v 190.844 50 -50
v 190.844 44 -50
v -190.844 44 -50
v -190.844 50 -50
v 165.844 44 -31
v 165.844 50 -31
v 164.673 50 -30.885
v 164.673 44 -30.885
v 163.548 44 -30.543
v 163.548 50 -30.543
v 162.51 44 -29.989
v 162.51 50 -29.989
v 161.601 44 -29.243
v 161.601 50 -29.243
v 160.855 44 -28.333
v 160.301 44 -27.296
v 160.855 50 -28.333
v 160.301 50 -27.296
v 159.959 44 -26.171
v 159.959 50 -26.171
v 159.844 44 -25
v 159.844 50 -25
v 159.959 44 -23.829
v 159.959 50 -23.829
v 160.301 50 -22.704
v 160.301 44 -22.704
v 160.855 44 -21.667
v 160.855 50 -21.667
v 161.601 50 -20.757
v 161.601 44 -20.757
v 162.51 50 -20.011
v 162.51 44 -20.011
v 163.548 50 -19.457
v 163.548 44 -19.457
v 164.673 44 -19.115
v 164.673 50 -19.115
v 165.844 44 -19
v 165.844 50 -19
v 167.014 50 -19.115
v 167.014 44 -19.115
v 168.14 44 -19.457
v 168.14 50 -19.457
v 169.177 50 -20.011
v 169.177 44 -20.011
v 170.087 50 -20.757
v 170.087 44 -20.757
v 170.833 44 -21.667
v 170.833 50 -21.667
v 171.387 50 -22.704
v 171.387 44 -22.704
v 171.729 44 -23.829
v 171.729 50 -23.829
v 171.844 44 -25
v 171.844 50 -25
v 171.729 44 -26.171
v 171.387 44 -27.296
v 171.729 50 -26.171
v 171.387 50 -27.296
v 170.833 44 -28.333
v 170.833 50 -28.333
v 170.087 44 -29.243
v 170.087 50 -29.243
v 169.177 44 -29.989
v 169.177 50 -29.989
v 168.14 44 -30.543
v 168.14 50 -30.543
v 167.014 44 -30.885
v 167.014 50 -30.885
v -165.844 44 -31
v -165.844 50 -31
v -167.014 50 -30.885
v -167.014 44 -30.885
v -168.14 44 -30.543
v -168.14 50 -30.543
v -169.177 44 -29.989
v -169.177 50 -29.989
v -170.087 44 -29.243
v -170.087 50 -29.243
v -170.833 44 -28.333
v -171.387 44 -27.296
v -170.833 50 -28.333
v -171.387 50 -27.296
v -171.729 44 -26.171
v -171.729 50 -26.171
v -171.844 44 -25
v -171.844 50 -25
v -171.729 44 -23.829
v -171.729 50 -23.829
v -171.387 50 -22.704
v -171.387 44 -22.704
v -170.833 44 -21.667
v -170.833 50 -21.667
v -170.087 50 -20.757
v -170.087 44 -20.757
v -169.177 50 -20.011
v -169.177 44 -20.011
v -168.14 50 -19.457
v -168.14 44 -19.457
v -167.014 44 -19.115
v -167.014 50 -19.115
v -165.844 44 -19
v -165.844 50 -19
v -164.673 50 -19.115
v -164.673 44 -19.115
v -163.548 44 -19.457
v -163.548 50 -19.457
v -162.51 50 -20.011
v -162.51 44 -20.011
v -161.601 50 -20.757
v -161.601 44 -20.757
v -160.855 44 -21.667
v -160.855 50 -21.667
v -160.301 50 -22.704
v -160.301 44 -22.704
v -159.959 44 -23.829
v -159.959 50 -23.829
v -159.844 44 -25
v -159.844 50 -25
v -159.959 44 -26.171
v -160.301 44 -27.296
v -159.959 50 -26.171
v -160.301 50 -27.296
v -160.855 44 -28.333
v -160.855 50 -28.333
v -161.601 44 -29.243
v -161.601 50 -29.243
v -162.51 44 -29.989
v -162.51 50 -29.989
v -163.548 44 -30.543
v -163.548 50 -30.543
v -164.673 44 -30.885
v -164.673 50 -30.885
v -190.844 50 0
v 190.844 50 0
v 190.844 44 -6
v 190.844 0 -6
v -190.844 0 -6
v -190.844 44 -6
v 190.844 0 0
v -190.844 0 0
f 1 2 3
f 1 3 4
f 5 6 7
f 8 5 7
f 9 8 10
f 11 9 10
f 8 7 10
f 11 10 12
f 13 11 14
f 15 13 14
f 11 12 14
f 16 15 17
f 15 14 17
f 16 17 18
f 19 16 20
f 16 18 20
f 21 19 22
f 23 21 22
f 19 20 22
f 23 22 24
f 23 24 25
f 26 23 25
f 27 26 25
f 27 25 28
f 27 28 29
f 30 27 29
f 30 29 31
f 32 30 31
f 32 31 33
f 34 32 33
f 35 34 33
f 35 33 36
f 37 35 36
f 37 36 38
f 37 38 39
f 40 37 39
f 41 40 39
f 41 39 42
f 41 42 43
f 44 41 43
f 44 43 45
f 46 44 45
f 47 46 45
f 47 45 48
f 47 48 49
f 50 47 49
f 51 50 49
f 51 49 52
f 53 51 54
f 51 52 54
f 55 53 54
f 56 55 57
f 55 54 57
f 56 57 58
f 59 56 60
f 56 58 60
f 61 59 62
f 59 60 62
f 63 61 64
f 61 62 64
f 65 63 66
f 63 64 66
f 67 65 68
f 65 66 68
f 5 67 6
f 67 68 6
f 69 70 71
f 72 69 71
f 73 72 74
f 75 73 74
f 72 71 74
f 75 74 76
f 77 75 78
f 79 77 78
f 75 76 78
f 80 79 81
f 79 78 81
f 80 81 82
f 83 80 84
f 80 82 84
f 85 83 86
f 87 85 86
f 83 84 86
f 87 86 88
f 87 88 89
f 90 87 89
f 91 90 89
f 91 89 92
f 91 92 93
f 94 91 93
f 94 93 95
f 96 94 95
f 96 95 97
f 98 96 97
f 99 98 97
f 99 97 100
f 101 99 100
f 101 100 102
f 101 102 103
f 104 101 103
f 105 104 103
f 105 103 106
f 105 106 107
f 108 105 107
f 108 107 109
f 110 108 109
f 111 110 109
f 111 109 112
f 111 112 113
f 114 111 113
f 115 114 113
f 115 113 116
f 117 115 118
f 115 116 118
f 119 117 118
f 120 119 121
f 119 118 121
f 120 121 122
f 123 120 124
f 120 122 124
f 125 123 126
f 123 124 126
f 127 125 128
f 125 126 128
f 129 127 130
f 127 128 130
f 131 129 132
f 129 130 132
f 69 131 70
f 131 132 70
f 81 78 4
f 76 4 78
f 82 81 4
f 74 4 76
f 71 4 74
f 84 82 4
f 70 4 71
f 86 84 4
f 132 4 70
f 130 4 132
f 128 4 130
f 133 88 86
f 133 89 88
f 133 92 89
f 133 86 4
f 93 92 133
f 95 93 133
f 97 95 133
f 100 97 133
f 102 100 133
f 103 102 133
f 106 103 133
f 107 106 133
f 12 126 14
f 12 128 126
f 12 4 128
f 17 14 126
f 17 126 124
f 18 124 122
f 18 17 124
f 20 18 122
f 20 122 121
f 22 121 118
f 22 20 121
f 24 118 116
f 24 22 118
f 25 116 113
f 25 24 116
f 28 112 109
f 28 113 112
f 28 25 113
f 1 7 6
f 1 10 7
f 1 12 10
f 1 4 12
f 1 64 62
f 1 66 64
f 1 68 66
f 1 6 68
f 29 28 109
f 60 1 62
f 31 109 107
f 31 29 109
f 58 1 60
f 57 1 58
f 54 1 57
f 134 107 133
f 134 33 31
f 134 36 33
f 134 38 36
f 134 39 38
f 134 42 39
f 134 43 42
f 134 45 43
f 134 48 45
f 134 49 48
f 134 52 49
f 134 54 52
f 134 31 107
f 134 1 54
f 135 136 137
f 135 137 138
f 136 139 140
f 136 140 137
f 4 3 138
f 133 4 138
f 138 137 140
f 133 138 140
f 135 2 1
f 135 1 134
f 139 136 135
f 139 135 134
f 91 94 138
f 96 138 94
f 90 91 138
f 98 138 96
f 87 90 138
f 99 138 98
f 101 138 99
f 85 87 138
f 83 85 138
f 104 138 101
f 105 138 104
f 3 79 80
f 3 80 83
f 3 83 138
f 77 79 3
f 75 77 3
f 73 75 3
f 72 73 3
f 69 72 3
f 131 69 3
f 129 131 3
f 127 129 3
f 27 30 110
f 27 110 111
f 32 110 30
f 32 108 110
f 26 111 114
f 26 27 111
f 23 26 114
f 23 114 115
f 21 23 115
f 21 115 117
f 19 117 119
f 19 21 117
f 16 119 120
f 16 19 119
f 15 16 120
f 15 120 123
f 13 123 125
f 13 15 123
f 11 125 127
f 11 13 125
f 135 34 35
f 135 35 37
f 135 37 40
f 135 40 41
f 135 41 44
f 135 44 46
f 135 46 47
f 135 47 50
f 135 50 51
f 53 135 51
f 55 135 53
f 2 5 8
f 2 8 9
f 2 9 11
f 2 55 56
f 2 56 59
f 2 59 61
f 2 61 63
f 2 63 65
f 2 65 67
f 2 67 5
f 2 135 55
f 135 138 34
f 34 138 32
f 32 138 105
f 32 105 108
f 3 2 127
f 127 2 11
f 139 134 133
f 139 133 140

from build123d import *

# Parameters (mm, degrees)
PAD_DEPTH               = 381.68773
COPYSKETCH001_R         = 6
POCKET_DEPTH            = 50.001
PADBODY_PITCH_ANGLE     = 90
PADBODY_PLACEMENT_ANGLE = -180


with BuildPart() as part:
    # Sketch → Pad (new body)
    with BuildSketch(Plane.XY):
        Polygon((0, 0), (0, 50), (6, 50), (6, 6), (50, 6), (50, 0), align=None)
    extrude(amount=PAD_DEPTH)

    # CopySketch001 (on Pad) → Pocket (cut, through all)
    with BuildSketch(Plane.XZ):
        with Locations((25, 25)):
            Circle(COPYSKETCH001_R)
        with Locations((25, 356.68773)):
            Circle(COPYSKETCH001_R)
    extrude(amount=-POCKET_DEPTH, mode=Mode.SUBTRACT)


with BuildPart() as part_1:
    # PadBody pitch: moved
    add(part.part.rotate(Axis((0, 0, 0), (0, 1, 0)), PADBODY_PITCH_ANGLE))


with BuildPart() as part_2:
    # PadBody placement: moved
    add(part_1.part.moved(Location((190.843865, 50, 0))).rotate(Axis((190.843865, 50, 0), (0, 0, 1)), PADBODY_PLACEMENT_ANGLE))


solid = part_2.part
